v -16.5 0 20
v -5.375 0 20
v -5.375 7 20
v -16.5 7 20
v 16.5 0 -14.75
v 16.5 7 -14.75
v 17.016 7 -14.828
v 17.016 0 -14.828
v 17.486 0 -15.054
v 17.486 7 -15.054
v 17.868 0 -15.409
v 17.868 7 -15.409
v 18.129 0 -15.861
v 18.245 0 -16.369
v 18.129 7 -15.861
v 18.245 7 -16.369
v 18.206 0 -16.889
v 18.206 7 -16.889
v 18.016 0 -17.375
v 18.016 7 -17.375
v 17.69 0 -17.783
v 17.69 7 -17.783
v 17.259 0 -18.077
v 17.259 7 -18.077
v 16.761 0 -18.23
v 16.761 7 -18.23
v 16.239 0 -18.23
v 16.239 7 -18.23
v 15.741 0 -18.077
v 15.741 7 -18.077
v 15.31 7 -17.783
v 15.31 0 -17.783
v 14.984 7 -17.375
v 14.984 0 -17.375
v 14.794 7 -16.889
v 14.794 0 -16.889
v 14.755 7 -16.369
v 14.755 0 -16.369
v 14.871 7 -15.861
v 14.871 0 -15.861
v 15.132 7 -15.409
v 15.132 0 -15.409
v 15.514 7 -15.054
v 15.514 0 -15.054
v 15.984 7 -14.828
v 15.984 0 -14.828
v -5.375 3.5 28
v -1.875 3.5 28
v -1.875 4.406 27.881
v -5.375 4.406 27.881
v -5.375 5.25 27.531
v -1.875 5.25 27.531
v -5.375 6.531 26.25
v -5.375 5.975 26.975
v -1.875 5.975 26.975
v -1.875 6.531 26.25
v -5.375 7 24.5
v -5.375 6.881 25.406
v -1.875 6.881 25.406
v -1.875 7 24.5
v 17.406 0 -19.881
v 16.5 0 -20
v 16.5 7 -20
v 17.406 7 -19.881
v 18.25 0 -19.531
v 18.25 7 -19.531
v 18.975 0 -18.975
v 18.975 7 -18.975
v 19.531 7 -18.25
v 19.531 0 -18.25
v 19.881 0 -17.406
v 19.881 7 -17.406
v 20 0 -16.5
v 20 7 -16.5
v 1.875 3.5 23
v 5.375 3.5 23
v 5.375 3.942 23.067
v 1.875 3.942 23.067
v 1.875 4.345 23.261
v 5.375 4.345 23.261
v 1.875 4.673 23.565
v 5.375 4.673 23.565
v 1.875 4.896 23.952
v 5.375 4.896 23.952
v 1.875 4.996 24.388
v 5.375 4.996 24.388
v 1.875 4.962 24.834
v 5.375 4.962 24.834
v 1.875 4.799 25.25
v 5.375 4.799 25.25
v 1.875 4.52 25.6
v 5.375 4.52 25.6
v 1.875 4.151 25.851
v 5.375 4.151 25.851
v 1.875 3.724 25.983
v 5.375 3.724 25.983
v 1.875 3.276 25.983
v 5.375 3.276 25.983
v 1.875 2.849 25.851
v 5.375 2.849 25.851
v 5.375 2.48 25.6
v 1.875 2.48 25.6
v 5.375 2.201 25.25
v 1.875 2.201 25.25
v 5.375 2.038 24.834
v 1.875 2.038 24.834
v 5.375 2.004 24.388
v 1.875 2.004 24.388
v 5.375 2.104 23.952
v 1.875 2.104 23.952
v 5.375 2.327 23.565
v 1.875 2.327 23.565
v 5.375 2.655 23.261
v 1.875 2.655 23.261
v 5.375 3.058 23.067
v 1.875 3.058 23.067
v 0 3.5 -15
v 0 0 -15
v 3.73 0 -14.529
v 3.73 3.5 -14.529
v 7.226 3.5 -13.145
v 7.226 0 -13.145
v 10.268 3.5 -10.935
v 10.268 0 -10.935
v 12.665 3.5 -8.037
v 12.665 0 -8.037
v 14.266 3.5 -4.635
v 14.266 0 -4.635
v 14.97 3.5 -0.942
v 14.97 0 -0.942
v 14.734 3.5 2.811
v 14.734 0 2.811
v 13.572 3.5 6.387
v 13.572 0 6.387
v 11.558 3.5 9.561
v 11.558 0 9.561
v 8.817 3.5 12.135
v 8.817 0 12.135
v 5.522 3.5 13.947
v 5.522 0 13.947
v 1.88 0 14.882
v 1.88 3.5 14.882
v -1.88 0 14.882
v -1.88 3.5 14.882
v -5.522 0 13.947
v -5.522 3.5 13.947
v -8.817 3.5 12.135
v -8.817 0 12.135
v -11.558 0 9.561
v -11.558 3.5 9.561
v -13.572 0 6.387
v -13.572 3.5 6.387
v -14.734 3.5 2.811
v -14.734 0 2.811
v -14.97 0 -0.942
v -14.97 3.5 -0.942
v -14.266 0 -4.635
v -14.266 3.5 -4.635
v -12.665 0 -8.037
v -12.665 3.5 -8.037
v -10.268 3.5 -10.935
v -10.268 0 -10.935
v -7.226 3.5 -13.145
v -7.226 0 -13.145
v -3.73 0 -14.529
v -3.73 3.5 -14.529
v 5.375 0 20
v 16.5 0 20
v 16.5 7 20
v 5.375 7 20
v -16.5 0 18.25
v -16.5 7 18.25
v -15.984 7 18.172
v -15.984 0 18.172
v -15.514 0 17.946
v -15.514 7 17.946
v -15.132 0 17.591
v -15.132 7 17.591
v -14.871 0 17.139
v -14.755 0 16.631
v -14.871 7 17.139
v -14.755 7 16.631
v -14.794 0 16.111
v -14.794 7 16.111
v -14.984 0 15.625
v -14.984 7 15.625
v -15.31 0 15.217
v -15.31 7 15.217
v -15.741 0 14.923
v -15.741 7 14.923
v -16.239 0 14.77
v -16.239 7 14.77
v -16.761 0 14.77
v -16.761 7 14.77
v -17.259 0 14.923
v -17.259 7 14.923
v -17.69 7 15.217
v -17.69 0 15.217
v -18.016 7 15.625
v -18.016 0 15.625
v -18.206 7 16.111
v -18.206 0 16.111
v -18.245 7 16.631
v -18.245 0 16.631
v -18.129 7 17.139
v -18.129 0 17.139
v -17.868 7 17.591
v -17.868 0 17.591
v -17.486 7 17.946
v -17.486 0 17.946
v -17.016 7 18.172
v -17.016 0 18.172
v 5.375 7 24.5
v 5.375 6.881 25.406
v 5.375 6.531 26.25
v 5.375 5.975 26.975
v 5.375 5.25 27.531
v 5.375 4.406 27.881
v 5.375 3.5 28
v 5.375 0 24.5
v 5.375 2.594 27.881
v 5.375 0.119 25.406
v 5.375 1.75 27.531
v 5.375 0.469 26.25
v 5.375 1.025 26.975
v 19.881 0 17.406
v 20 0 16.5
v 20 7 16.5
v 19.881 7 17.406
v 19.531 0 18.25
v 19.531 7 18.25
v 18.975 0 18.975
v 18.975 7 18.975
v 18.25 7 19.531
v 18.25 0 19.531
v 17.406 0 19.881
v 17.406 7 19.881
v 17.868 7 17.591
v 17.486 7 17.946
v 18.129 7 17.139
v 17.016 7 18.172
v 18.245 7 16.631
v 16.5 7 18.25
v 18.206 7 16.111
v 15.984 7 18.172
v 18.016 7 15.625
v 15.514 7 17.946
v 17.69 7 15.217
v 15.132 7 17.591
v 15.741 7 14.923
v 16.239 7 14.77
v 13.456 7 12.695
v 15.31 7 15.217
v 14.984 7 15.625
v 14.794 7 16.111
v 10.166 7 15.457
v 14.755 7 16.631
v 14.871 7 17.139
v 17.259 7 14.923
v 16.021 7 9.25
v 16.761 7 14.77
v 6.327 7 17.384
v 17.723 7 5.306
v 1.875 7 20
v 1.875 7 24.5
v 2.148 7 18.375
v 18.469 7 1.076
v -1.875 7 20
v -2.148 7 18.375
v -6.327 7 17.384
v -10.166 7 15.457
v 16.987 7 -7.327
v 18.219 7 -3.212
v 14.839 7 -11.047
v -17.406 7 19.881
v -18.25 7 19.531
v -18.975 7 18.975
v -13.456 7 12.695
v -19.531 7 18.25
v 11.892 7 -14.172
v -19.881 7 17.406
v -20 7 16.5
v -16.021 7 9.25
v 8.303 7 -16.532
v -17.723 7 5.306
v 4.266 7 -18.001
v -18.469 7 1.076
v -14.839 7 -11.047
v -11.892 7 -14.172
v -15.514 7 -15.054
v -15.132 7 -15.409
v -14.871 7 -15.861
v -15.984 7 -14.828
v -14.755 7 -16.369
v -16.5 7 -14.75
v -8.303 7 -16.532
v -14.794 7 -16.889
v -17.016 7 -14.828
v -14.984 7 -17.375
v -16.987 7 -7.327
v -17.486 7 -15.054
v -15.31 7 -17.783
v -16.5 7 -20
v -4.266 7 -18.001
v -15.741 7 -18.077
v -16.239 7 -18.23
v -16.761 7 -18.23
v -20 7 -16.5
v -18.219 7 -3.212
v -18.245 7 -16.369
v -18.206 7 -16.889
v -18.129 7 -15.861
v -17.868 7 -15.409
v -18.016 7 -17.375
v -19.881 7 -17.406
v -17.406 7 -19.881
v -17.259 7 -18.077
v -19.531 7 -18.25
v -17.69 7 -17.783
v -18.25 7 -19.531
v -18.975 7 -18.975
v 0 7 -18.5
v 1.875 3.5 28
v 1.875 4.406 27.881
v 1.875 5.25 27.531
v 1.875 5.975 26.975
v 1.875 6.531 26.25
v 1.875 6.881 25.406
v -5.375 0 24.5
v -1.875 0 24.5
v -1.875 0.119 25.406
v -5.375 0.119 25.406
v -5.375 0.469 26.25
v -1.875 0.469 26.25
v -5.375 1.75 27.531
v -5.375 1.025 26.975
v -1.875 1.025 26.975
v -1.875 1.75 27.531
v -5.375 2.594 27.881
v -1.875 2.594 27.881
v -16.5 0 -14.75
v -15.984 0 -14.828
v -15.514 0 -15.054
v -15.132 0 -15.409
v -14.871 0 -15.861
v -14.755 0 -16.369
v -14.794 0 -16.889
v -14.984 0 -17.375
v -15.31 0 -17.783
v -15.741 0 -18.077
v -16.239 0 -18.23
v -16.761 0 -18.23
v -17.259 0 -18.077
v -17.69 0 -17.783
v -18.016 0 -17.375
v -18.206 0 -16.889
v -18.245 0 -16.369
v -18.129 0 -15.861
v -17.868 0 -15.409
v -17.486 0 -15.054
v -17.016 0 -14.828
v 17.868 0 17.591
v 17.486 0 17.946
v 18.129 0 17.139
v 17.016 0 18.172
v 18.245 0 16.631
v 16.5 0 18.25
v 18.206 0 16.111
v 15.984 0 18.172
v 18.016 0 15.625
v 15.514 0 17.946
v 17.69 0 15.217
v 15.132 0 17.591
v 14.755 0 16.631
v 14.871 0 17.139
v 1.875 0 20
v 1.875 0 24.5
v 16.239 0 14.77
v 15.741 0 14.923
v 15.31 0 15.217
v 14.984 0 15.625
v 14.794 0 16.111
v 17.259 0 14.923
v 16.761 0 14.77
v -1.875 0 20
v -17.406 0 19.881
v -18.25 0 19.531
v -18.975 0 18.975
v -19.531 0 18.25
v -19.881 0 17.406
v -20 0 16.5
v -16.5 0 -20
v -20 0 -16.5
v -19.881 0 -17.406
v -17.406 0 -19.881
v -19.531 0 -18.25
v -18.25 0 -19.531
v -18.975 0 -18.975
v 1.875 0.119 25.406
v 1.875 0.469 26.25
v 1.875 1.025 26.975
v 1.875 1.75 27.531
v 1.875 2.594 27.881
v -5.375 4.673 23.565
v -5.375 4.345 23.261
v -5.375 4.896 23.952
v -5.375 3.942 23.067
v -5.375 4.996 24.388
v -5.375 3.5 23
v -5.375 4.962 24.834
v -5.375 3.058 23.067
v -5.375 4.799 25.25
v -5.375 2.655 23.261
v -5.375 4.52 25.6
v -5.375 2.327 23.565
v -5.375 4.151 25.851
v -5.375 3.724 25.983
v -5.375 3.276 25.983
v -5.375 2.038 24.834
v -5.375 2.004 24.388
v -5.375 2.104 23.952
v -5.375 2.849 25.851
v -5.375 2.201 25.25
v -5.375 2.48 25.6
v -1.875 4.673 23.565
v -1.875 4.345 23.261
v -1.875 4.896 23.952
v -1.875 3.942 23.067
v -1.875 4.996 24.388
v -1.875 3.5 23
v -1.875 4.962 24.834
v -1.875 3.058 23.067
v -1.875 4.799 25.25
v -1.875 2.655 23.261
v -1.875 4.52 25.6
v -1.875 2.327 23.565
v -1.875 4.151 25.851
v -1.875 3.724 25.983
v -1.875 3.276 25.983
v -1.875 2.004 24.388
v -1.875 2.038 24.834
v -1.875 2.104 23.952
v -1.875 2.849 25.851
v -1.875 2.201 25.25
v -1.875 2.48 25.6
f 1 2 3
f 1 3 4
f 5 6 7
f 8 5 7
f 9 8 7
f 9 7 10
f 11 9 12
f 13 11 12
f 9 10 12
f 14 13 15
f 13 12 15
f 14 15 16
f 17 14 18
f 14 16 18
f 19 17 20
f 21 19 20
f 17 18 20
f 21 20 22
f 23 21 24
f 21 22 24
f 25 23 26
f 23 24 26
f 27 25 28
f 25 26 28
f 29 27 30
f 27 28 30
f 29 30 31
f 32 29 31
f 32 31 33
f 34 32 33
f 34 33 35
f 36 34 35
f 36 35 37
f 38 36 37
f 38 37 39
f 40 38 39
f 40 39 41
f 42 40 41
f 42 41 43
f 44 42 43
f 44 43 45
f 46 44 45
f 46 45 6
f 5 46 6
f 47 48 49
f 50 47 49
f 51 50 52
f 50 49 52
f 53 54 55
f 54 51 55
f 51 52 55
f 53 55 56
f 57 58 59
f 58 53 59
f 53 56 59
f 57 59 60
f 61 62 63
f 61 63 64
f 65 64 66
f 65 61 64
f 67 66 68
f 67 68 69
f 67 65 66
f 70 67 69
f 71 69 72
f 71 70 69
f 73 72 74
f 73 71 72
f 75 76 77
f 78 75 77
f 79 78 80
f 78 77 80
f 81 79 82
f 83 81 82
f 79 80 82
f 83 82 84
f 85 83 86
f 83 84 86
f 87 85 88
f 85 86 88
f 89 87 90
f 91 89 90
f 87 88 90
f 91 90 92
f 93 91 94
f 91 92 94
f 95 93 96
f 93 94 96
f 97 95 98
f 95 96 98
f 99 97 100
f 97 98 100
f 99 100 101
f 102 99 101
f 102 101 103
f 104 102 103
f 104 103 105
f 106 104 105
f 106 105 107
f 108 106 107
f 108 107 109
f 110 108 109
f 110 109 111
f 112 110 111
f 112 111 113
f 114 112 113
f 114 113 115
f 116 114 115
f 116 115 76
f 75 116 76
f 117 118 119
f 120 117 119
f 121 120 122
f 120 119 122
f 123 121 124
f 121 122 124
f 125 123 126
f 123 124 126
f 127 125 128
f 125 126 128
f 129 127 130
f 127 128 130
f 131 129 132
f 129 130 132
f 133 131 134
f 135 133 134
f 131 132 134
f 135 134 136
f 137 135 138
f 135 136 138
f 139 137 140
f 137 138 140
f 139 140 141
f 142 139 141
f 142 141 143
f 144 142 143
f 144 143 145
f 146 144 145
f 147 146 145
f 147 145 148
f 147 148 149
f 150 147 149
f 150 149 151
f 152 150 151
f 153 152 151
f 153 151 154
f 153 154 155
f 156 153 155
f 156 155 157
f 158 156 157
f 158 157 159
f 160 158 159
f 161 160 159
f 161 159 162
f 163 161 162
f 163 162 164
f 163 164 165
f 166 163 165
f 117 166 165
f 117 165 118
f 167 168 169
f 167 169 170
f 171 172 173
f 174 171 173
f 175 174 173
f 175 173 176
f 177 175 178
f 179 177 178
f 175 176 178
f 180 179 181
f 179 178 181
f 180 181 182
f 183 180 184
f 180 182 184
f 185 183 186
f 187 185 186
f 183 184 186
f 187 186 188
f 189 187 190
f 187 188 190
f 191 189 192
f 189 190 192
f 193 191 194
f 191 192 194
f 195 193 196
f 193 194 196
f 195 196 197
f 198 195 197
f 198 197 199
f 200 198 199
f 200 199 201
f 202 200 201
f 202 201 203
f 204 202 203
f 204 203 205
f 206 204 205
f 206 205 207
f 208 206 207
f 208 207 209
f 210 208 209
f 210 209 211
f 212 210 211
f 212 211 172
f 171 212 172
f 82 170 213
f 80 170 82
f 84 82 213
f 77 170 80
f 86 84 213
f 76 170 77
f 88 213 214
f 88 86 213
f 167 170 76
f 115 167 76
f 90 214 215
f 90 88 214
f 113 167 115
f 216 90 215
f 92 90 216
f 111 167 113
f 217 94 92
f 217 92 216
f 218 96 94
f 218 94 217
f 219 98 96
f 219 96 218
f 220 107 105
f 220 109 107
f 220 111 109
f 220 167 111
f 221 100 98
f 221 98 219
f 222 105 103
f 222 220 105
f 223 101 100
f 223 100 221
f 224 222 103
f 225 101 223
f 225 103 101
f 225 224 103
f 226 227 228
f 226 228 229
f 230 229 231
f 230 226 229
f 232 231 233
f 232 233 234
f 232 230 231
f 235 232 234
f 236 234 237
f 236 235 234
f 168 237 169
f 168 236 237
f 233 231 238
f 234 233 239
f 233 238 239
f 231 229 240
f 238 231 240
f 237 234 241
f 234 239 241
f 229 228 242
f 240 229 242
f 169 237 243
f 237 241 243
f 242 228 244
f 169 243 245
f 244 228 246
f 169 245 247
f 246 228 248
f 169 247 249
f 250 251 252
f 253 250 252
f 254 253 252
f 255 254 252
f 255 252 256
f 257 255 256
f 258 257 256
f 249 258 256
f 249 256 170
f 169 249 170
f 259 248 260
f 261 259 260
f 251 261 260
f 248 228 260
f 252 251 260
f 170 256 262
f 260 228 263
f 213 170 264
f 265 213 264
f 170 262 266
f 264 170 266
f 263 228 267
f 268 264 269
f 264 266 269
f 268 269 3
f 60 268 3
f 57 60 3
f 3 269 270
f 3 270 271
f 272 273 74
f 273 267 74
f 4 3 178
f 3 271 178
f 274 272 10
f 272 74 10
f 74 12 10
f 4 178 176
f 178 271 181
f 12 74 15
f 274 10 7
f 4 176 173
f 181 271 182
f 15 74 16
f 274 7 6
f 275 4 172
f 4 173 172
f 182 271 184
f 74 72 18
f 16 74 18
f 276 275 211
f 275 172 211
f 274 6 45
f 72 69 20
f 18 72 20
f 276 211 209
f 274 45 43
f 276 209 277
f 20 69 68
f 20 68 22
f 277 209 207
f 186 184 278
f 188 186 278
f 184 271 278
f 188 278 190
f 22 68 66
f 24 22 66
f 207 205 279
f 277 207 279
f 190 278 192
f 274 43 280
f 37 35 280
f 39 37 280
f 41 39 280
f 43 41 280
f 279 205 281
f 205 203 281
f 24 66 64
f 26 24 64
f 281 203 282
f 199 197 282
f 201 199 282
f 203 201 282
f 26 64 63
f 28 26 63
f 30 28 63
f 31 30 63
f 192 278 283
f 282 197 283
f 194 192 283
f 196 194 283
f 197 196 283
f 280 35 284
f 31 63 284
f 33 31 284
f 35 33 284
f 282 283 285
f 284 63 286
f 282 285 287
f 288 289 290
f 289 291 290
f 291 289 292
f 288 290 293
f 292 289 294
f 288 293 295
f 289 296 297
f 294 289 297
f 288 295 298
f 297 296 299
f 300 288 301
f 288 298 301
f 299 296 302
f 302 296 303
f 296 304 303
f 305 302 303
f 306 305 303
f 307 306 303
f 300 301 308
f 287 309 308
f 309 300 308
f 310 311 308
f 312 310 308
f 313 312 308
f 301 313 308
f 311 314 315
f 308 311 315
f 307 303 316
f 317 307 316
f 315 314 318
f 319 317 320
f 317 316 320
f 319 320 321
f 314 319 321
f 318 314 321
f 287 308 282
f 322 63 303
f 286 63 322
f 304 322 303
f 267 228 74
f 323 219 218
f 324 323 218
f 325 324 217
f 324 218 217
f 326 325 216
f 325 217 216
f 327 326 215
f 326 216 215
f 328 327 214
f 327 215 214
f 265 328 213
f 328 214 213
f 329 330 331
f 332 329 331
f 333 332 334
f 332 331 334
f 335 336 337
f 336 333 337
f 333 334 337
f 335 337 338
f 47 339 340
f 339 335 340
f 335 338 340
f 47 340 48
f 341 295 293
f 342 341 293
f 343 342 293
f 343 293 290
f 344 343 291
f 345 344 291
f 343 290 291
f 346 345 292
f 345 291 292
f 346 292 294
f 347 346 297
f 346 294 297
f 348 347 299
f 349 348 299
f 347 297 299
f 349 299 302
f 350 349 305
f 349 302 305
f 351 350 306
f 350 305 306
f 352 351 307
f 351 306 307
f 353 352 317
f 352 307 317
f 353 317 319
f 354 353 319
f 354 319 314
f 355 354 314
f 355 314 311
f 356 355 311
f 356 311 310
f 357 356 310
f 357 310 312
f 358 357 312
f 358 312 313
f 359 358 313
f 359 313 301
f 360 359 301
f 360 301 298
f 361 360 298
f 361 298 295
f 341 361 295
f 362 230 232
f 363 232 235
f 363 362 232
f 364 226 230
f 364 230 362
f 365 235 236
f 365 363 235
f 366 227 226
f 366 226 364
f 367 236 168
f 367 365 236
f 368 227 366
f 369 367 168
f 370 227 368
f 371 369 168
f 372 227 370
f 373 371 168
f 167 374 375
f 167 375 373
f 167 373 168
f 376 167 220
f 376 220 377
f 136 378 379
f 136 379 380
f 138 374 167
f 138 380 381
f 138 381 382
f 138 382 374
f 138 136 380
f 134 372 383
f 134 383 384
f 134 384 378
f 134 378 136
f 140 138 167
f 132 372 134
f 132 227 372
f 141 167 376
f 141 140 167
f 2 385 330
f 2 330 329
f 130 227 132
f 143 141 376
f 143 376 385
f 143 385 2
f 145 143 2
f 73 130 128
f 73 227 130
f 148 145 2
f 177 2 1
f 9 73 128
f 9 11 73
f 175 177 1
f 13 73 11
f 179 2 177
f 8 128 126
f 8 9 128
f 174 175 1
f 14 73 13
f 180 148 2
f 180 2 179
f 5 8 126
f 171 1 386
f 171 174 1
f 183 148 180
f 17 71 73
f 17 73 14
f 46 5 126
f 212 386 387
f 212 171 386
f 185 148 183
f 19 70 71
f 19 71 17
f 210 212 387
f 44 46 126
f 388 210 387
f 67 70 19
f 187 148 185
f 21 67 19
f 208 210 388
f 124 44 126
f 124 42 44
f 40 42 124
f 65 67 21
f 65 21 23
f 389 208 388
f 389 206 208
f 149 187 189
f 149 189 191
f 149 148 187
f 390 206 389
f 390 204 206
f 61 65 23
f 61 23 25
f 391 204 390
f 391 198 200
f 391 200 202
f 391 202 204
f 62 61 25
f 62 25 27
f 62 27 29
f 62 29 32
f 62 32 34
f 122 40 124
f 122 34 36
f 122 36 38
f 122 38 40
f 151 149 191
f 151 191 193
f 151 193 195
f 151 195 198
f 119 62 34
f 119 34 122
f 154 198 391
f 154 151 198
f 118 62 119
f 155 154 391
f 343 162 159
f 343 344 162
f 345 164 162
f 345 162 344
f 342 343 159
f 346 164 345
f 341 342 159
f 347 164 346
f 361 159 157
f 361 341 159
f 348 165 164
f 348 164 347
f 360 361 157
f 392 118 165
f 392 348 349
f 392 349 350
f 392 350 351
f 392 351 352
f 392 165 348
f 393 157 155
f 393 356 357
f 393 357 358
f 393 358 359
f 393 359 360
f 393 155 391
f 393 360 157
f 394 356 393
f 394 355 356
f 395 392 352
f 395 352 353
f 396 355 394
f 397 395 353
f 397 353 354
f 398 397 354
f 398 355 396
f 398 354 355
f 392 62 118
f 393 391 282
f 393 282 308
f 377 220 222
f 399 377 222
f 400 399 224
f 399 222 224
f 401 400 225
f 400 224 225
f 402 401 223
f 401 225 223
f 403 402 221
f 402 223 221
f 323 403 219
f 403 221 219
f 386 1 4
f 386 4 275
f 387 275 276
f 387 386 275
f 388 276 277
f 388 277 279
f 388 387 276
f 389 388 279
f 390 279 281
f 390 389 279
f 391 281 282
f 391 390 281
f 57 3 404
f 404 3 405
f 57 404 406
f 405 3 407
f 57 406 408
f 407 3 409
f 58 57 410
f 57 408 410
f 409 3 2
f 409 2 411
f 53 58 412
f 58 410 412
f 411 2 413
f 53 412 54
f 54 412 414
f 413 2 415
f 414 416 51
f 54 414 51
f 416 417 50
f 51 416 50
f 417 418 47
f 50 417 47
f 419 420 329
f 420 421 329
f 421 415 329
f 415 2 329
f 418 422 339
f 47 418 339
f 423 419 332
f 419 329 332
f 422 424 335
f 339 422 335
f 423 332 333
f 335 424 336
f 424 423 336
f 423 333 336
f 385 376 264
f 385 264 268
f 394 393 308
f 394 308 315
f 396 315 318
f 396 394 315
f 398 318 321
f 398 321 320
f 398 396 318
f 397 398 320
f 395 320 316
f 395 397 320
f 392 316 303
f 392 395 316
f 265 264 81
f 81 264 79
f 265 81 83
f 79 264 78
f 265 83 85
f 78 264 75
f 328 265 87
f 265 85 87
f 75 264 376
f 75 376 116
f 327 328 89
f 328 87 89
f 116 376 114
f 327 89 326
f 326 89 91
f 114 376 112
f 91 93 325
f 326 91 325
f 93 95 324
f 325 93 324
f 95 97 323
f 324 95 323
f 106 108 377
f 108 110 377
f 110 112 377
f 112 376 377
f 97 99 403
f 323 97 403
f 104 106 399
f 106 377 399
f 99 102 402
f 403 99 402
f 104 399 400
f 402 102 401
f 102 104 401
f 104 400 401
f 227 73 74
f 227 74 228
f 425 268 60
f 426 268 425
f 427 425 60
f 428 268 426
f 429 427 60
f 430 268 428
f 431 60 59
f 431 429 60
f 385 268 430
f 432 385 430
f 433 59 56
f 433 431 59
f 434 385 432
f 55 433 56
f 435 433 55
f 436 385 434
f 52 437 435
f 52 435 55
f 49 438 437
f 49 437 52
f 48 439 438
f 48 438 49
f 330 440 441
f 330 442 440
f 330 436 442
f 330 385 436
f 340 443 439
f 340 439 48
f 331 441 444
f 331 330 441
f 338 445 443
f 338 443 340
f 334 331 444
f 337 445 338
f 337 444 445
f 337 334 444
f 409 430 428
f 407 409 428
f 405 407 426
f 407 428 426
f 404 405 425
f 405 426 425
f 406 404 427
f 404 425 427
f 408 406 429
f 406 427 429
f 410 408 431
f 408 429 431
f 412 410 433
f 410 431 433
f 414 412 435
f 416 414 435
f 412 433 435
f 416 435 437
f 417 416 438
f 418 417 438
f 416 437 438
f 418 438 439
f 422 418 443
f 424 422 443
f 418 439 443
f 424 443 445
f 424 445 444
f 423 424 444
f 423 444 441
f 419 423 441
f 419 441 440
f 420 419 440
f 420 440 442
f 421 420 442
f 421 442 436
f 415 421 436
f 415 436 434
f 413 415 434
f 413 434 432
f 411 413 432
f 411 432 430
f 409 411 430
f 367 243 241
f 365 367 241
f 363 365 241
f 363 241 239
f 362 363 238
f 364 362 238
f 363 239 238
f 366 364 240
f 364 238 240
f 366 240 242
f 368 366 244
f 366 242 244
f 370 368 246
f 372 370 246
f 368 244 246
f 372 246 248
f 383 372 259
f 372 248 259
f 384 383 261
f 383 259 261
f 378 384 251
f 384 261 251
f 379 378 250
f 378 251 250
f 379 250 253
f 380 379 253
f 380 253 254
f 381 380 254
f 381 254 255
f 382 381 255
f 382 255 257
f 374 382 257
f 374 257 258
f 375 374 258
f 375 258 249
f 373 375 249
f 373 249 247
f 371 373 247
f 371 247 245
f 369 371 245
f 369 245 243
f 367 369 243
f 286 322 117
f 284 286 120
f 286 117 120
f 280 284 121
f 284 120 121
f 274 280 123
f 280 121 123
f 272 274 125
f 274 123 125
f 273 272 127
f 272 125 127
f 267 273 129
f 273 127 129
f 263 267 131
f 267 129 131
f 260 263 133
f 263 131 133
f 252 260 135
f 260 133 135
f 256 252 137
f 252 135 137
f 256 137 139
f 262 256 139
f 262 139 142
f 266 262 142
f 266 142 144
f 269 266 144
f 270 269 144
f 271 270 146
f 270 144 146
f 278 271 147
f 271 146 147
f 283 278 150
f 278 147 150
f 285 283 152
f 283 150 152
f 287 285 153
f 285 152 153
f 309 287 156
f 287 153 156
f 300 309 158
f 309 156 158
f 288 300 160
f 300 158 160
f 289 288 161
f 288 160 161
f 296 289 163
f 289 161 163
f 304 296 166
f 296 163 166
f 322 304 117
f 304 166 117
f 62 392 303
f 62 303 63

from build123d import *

# Parameters (mm, degrees)
BOSS_EXTRUDE1_DEPTH = 7
CUT_EXTRUDE2_REACH  = 31.138
SKETCH3_R           = 1.75
SKETCH7_W           = 3.5
SKETCH7_H           = 28
BOSS_EXTRUDE2_DEPTH = 7
CUT_EXTRUDE3_DEPTH  = 39.430334698
SKETCH9_R           = 1.5
CUT_EXTRUDE4_DEPTH  = 39.430334698
SKETCH13_R          = 15
CUT_EXTRUDE5_DEPTH  = 36.114099732


with BuildPart() as part:
    # Sketch1 → Boss-Extrude1 (new body)
    with BuildSketch(Plane(origin=(0, 0, 0), x_dir=(1, 0, 0), z_dir=(0, 1, 0))):
        with BuildLine():
            Line((-16.5, 20), (16.5, 20))
            ThreePointArc((16.5, 20), (18.974873734, 18.974873734), (20, 16.5))
            Line((20, 16.5), (20, -16.5))
            ThreePointArc((20, -16.5), (18.974873734, -18.974873734), (16.5, -20))
            Line((16.5, -20), (-16.5, -20))
            ThreePointArc((-16.5, -20), (-18.974873734, -18.974873734), (-20, -16.5))
            Line((-20, -16.5), (-20, 16.5))
            ThreePointArc((-20, 16.5), (-18.974873734, 18.974873734), (-16.5, 20))
        make_face()
    extrude(amount=BOSS_EXTRUDE1_DEPTH)

    # Sketch3 → Cut-Extrude2 (cut, up to next)
    with BuildSketch(Plane(origin=(0, 7, 0), x_dir=(1, 0, 0), z_dir=(0, 1, 0)), mode=Mode.PRIVATE) as cut_extrude2_sk1:
        with Locations(Location((-16.5, 16.5, 0), (0, 0, 270))):
            Circle(SKETCH3_R)
    cut_extrude2_tool1 = extrude(cut_extrude2_sk1.sketch, amount=-CUT_EXTRUDE2_REACH, mode=Mode.PRIVATE) & part.part
    # Sketch3 → Cut-Extrude2 (cut, up to next)
    with BuildSketch(Plane(origin=(0, 7, 0), x_dir=(1, 0, 0), z_dir=(0, 1, 0)), mode=Mode.PRIVATE) as cut_extrude2_sk2:
        with Locations(Location((16.5, 16.5, 0), (0, 0, 270))):
            Circle(SKETCH3_R)
    cut_extrude2_tool2 = extrude(cut_extrude2_sk2.sketch, amount=-CUT_EXTRUDE2_REACH, mode=Mode.PRIVATE) & part.part
    # Sketch3 → Cut-Extrude2 (cut, up to next)
    with BuildSketch(Plane(origin=(0, 7, 0), x_dir=(1, 0, 0), z_dir=(0, 1, 0)), mode=Mode.PRIVATE) as cut_extrude2_sk3:
        with Locations(Location((16.5, -16.5, 0), (0, 0, 270))):
            Circle(SKETCH3_R)
    cut_extrude2_tool3 = extrude(cut_extrude2_sk3.sketch, amount=-CUT_EXTRUDE2_REACH, mode=Mode.PRIVATE) & part.part
    # Sketch3 → Cut-Extrude2 (cut, up to next)
    with BuildSketch(Plane(origin=(0, 7, 0), x_dir=(1, 0, 0), z_dir=(0, 1, 0)), mode=Mode.PRIVATE) as cut_extrude2_sk4:
        with Locations(Location((-16.5, -16.5, 0), (0, 0, 270))):
            Circle(SKETCH3_R)
    cut_extrude2_tool4 = extrude(cut_extrude2_sk4.sketch, amount=-CUT_EXTRUDE2_REACH, mode=Mode.PRIVATE) & part.part
    add(cut_extrude2_tool1.solids().sort_by_distance((-16.5, 7, -16.5))[0], mode=Mode.SUBTRACT)
    add(cut_extrude2_tool2.solids().sort_by_distance((16.5, 7, -16.5))[0], mode=Mode.SUBTRACT)
    add(cut_extrude2_tool3.solids().sort_by_distance((16.5, 7, 16.5))[0], mode=Mode.SUBTRACT)
    add(cut_extrude2_tool4.solids().sort_by_distance((-16.5, 7, 16.5))[0], mode=Mode.SUBTRACT)

    # Sketch7 → Boss-Extrude2 (add)
    with BuildSketch(Plane.XZ):
        with Locations((3.625, 14)):
            Rectangle(SKETCH7_W, SKETCH7_H)
        with Locations((-3.625, 14)):
            Rectangle(SKETCH7_W, SKETCH7_H)
    extrude(amount=-BOSS_EXTRUDE2_DEPTH)

    # Sketch8 → Cut-Extrude3 (cut, through all)
    with BuildSketch(Plane(origin=(5.375, 0, 0), x_dir=(0, 0, -1), z_dir=(1, 0, 0))):
        with BuildLine():
            ThreePointArc((-28, 3.5), (-26.974873734, 5.974873734), (-24.5, 7))
            Line((-24.5, 7), (-28, 7))
            Line((-28, 7), (-28, 3.5))
        make_face()
        with BuildLine():
            ThreePointArc((-24.5, 0), (-26.974873734, 1.025126266), (-28, 3.5))
            Line((-28, 3.5), (-28, 0))
            Line((-28, 0), (-24.5, 0))
        make_face()
    extrude(amount=-CUT_EXTRUDE3_DEPTH, mode=Mode.SUBTRACT)

    # Sketch9 → Cut-Extrude4 (cut, through all)
    with BuildSketch(Plane(origin=(5.375, 0, 0), x_dir=(0, 0, -1), z_dir=(1, 0, 0))):
        with Locations((-24.5, 3.5)):
            Circle(SKETCH9_R)
    extrude(amount=-CUT_EXTRUDE4_DEPTH, mode=Mode.SUBTRACT)

    # Sketch13 → Cut-Extrude5 (cut, through all)
    with BuildSketch(Plane.XZ):
        with Locations(Location((0, 0, 0), (0, 0, 270))):
            Circle(SKETCH13_R)
    extrude(amount=-CUT_EXTRUDE5_DEPTH, mode=Mode.SUBTRACT)

    # Sketch14 → Cut-Revolve1 (revolve, cut)
    with BuildSketch(Plane(origin=(0, 0, 0), x_dir=(0, 0, -1), z_dir=(1, 0, 0))):
        Polygon((0, 0), (0, 7), (18.5, 7), (15, 3.5), (15, 0), align=None)
    revolve(axis=Axis((0, 7, 0), (0, -1, 0)), mode=Mode.SUBTRACT)


solid = part.part
